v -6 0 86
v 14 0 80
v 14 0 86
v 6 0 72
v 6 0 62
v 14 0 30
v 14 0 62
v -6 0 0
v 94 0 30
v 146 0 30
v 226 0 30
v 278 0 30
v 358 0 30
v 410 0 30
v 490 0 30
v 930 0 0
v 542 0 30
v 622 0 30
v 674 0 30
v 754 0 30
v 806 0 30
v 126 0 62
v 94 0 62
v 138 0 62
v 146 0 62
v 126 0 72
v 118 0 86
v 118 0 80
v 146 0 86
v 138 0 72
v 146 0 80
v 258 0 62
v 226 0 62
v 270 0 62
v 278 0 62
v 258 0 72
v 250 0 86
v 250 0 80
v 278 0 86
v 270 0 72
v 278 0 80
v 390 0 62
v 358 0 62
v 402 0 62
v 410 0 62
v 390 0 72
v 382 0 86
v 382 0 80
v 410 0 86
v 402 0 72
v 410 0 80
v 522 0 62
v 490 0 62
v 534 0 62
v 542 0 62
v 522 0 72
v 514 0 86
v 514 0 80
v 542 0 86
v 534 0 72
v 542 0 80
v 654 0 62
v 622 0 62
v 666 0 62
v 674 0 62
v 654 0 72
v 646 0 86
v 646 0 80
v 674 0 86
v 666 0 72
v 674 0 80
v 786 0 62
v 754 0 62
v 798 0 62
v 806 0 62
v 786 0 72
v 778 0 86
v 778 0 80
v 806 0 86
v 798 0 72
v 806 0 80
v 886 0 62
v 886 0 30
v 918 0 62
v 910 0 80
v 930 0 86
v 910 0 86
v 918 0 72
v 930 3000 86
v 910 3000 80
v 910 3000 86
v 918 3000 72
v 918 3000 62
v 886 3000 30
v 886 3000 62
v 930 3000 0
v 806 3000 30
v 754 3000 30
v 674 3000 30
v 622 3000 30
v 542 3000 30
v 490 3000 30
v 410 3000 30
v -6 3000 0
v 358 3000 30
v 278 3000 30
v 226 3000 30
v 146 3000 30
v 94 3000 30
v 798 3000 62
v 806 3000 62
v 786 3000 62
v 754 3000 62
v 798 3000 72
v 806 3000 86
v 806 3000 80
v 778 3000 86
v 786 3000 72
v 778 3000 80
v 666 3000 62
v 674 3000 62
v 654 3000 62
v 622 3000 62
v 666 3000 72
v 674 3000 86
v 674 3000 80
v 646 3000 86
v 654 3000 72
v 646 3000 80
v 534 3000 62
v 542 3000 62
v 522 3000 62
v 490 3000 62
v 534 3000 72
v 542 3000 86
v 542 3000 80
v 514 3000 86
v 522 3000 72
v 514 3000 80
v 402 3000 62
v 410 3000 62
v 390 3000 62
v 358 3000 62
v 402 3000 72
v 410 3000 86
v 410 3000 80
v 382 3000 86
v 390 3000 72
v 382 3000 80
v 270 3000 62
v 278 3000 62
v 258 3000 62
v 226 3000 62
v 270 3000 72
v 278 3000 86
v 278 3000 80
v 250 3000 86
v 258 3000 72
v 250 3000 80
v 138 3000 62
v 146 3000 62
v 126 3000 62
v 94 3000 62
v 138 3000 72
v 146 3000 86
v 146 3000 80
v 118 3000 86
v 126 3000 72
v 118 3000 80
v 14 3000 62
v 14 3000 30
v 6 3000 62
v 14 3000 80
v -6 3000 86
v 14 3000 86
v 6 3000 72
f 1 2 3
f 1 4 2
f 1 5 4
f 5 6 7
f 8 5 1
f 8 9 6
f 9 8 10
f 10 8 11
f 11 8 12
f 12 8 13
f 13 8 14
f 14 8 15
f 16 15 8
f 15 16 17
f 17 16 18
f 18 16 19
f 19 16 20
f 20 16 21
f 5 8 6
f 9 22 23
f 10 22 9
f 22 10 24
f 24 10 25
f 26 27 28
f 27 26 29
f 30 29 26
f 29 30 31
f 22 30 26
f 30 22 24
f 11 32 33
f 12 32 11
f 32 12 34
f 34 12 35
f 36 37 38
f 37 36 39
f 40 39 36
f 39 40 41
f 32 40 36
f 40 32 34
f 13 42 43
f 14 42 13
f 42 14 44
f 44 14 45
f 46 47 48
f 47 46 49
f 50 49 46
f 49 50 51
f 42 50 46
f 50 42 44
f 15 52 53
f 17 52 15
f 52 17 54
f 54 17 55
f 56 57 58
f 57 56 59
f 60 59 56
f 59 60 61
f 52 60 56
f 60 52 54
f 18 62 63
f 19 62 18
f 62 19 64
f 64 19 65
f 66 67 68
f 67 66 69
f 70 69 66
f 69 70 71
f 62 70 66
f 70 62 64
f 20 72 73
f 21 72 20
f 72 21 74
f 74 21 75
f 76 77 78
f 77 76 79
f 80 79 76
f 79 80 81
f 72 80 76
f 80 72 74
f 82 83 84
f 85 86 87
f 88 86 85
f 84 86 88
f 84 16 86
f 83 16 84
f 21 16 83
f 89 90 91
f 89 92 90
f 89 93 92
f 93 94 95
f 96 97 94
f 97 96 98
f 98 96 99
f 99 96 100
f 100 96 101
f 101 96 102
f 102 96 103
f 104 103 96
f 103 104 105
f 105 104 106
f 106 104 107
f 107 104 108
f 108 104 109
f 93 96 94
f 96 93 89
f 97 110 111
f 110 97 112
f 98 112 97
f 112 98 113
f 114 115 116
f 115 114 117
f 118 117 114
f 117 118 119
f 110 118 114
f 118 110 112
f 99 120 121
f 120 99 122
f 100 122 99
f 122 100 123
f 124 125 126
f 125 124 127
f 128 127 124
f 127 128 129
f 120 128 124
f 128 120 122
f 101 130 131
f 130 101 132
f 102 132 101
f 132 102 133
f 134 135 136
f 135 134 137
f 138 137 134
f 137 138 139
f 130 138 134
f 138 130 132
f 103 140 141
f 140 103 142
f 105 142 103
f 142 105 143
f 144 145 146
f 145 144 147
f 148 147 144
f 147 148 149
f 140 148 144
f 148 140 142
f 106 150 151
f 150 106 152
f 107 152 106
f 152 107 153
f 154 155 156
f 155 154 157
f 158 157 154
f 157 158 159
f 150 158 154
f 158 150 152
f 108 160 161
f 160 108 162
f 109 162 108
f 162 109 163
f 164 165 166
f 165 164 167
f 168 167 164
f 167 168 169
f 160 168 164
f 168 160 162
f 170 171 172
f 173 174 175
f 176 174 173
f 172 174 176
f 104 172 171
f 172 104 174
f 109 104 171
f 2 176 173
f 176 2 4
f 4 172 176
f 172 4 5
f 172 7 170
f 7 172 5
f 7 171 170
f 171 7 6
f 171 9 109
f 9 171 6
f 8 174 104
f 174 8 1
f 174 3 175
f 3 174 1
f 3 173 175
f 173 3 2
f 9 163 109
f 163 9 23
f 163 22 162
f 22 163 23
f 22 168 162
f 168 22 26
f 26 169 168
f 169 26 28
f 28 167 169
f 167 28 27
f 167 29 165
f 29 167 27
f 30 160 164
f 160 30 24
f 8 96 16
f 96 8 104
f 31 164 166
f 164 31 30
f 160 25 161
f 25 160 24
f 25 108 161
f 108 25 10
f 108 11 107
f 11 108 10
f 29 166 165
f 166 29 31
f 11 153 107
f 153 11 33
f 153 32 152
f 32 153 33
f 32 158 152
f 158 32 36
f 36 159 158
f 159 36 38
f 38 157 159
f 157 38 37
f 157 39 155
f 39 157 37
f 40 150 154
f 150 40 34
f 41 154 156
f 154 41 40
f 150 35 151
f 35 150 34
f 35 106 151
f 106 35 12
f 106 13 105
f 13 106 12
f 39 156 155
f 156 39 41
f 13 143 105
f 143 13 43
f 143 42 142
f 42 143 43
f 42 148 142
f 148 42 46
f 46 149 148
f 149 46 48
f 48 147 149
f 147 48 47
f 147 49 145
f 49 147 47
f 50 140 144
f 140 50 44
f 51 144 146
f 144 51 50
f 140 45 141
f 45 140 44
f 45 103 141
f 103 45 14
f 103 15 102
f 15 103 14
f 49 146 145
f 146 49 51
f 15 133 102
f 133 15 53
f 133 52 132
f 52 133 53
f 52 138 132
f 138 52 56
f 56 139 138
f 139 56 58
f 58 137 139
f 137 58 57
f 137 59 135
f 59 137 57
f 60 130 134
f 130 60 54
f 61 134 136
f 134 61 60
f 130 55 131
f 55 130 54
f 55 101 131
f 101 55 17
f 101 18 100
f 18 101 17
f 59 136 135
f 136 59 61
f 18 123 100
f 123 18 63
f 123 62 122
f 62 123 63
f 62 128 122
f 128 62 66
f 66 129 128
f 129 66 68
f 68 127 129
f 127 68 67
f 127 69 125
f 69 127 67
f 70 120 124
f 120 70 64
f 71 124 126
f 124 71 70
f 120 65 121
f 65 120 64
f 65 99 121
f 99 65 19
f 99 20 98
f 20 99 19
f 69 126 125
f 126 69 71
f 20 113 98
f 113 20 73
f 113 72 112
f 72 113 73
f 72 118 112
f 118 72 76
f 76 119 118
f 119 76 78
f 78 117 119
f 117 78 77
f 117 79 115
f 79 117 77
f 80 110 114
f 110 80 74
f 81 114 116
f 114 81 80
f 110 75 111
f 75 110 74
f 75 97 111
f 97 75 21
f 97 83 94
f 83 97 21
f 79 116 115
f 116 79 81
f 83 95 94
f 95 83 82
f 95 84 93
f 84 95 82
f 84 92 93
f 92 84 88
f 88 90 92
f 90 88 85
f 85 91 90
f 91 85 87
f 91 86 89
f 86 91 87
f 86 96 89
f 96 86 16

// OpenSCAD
module feed_trough_A(slot_height=20, slot_length=100, slot_depth=20) {
    translate([0, 0, 14+22+slot_height+slot_depth+20])
    rotate([90,180,180])
    linear_extrude(height=slot_length)
    polygon(points=[
        [-6, 0],
        [14, 0],
        [14, 6],
        [6, 14],
        [6, 14+slot_height],
        [14, 14+slot_height],
        [14, 14+slot_height+2+slot_depth+10],
        [-6, 14+slot_height+2+slot_depth+10]
    ]);
}

module feed_though_B(slot_height=20, slot_length=100, slot_width=80, slot_depth=20) {
    translate([12+slot_width, 0, 14+22+slot_height+slot_depth+20])
    rotate([90,180,180])
    linear_extrude(height=slot_length)
    polygon(points=[
        [6, 0],
        [-14, 0],
        [-14, 6],
        [-6, 14],
        [-6, 14+slot_height],
        [-6-32, 14+slot_height],
        [-6-32, 14+slot_height+2+slot_depth+10],
        [6, 14+slot_height+2+slot_depth+10]
    ]); 
}

module feed_though_C(slot_length = 100, slot_width = 80)
{
    translate([0, 0, 30])
    rotate([90,180,180])
    linear_extrude(height=slot_length)
    polygon(points=[
        [-6, 0],
        [-6, 30],
        [12+slot_width+6, 30],
        [12+slot_width+6, 0]
    ]); 
}

module feed_trough(slot_height=10, slot_length=100, slot_width=80, slot_depth=20){
    feed_trough_A(slot_height, slot_length, slot_depth);
    feed_though_B(slot_height, slot_length, slot_width, slot_depth);
    feed_though_C(slot_length, slot_width);
}

module feed_trouugh_array_corner(slot_length=100, offset=0, is_mirror=0){
    xOffset = (is_mirror != 0) ? -6 : slot_length+6;
    yOffset = (is_mirror != 0) ? offset+(10+36+42) : -(10+36+42);
    zRotate = (is_mirror != 0) ? 90:270;
    
    translate([xOffset, yOffset, 66])
    rotate([90,180,zRotate])
    linear_extrude(height=slot_length+12)
    polygon(points=[
        [0, 0],
        [10, 0],
        [10+36, 36],
        [10+36+42, 36],
        [10+36+42, 66],
        [0, 66],
        [0, 0]
    ]); 
}


module feed_trough_array(num = 5, slot_height=10, slot_length=100, slot_width=80, slot_depth=20){
    for (i = [0 : num-1]) {
        translate([i * (slot_width + 12), 0, 0])
            feed_trough(slot_height, slot_length, slot_width, slot_depth);
    }
    //feed_trouugh_array_corner(num * (slot_width + 12), slot_length, 0);
    //feed_trouugh_array_corner(num * (slot_width + 12), slot_length, 1);
}

//scale(0.1)
feed_trough_array(7, 10, 3000, 120, 20);
    
